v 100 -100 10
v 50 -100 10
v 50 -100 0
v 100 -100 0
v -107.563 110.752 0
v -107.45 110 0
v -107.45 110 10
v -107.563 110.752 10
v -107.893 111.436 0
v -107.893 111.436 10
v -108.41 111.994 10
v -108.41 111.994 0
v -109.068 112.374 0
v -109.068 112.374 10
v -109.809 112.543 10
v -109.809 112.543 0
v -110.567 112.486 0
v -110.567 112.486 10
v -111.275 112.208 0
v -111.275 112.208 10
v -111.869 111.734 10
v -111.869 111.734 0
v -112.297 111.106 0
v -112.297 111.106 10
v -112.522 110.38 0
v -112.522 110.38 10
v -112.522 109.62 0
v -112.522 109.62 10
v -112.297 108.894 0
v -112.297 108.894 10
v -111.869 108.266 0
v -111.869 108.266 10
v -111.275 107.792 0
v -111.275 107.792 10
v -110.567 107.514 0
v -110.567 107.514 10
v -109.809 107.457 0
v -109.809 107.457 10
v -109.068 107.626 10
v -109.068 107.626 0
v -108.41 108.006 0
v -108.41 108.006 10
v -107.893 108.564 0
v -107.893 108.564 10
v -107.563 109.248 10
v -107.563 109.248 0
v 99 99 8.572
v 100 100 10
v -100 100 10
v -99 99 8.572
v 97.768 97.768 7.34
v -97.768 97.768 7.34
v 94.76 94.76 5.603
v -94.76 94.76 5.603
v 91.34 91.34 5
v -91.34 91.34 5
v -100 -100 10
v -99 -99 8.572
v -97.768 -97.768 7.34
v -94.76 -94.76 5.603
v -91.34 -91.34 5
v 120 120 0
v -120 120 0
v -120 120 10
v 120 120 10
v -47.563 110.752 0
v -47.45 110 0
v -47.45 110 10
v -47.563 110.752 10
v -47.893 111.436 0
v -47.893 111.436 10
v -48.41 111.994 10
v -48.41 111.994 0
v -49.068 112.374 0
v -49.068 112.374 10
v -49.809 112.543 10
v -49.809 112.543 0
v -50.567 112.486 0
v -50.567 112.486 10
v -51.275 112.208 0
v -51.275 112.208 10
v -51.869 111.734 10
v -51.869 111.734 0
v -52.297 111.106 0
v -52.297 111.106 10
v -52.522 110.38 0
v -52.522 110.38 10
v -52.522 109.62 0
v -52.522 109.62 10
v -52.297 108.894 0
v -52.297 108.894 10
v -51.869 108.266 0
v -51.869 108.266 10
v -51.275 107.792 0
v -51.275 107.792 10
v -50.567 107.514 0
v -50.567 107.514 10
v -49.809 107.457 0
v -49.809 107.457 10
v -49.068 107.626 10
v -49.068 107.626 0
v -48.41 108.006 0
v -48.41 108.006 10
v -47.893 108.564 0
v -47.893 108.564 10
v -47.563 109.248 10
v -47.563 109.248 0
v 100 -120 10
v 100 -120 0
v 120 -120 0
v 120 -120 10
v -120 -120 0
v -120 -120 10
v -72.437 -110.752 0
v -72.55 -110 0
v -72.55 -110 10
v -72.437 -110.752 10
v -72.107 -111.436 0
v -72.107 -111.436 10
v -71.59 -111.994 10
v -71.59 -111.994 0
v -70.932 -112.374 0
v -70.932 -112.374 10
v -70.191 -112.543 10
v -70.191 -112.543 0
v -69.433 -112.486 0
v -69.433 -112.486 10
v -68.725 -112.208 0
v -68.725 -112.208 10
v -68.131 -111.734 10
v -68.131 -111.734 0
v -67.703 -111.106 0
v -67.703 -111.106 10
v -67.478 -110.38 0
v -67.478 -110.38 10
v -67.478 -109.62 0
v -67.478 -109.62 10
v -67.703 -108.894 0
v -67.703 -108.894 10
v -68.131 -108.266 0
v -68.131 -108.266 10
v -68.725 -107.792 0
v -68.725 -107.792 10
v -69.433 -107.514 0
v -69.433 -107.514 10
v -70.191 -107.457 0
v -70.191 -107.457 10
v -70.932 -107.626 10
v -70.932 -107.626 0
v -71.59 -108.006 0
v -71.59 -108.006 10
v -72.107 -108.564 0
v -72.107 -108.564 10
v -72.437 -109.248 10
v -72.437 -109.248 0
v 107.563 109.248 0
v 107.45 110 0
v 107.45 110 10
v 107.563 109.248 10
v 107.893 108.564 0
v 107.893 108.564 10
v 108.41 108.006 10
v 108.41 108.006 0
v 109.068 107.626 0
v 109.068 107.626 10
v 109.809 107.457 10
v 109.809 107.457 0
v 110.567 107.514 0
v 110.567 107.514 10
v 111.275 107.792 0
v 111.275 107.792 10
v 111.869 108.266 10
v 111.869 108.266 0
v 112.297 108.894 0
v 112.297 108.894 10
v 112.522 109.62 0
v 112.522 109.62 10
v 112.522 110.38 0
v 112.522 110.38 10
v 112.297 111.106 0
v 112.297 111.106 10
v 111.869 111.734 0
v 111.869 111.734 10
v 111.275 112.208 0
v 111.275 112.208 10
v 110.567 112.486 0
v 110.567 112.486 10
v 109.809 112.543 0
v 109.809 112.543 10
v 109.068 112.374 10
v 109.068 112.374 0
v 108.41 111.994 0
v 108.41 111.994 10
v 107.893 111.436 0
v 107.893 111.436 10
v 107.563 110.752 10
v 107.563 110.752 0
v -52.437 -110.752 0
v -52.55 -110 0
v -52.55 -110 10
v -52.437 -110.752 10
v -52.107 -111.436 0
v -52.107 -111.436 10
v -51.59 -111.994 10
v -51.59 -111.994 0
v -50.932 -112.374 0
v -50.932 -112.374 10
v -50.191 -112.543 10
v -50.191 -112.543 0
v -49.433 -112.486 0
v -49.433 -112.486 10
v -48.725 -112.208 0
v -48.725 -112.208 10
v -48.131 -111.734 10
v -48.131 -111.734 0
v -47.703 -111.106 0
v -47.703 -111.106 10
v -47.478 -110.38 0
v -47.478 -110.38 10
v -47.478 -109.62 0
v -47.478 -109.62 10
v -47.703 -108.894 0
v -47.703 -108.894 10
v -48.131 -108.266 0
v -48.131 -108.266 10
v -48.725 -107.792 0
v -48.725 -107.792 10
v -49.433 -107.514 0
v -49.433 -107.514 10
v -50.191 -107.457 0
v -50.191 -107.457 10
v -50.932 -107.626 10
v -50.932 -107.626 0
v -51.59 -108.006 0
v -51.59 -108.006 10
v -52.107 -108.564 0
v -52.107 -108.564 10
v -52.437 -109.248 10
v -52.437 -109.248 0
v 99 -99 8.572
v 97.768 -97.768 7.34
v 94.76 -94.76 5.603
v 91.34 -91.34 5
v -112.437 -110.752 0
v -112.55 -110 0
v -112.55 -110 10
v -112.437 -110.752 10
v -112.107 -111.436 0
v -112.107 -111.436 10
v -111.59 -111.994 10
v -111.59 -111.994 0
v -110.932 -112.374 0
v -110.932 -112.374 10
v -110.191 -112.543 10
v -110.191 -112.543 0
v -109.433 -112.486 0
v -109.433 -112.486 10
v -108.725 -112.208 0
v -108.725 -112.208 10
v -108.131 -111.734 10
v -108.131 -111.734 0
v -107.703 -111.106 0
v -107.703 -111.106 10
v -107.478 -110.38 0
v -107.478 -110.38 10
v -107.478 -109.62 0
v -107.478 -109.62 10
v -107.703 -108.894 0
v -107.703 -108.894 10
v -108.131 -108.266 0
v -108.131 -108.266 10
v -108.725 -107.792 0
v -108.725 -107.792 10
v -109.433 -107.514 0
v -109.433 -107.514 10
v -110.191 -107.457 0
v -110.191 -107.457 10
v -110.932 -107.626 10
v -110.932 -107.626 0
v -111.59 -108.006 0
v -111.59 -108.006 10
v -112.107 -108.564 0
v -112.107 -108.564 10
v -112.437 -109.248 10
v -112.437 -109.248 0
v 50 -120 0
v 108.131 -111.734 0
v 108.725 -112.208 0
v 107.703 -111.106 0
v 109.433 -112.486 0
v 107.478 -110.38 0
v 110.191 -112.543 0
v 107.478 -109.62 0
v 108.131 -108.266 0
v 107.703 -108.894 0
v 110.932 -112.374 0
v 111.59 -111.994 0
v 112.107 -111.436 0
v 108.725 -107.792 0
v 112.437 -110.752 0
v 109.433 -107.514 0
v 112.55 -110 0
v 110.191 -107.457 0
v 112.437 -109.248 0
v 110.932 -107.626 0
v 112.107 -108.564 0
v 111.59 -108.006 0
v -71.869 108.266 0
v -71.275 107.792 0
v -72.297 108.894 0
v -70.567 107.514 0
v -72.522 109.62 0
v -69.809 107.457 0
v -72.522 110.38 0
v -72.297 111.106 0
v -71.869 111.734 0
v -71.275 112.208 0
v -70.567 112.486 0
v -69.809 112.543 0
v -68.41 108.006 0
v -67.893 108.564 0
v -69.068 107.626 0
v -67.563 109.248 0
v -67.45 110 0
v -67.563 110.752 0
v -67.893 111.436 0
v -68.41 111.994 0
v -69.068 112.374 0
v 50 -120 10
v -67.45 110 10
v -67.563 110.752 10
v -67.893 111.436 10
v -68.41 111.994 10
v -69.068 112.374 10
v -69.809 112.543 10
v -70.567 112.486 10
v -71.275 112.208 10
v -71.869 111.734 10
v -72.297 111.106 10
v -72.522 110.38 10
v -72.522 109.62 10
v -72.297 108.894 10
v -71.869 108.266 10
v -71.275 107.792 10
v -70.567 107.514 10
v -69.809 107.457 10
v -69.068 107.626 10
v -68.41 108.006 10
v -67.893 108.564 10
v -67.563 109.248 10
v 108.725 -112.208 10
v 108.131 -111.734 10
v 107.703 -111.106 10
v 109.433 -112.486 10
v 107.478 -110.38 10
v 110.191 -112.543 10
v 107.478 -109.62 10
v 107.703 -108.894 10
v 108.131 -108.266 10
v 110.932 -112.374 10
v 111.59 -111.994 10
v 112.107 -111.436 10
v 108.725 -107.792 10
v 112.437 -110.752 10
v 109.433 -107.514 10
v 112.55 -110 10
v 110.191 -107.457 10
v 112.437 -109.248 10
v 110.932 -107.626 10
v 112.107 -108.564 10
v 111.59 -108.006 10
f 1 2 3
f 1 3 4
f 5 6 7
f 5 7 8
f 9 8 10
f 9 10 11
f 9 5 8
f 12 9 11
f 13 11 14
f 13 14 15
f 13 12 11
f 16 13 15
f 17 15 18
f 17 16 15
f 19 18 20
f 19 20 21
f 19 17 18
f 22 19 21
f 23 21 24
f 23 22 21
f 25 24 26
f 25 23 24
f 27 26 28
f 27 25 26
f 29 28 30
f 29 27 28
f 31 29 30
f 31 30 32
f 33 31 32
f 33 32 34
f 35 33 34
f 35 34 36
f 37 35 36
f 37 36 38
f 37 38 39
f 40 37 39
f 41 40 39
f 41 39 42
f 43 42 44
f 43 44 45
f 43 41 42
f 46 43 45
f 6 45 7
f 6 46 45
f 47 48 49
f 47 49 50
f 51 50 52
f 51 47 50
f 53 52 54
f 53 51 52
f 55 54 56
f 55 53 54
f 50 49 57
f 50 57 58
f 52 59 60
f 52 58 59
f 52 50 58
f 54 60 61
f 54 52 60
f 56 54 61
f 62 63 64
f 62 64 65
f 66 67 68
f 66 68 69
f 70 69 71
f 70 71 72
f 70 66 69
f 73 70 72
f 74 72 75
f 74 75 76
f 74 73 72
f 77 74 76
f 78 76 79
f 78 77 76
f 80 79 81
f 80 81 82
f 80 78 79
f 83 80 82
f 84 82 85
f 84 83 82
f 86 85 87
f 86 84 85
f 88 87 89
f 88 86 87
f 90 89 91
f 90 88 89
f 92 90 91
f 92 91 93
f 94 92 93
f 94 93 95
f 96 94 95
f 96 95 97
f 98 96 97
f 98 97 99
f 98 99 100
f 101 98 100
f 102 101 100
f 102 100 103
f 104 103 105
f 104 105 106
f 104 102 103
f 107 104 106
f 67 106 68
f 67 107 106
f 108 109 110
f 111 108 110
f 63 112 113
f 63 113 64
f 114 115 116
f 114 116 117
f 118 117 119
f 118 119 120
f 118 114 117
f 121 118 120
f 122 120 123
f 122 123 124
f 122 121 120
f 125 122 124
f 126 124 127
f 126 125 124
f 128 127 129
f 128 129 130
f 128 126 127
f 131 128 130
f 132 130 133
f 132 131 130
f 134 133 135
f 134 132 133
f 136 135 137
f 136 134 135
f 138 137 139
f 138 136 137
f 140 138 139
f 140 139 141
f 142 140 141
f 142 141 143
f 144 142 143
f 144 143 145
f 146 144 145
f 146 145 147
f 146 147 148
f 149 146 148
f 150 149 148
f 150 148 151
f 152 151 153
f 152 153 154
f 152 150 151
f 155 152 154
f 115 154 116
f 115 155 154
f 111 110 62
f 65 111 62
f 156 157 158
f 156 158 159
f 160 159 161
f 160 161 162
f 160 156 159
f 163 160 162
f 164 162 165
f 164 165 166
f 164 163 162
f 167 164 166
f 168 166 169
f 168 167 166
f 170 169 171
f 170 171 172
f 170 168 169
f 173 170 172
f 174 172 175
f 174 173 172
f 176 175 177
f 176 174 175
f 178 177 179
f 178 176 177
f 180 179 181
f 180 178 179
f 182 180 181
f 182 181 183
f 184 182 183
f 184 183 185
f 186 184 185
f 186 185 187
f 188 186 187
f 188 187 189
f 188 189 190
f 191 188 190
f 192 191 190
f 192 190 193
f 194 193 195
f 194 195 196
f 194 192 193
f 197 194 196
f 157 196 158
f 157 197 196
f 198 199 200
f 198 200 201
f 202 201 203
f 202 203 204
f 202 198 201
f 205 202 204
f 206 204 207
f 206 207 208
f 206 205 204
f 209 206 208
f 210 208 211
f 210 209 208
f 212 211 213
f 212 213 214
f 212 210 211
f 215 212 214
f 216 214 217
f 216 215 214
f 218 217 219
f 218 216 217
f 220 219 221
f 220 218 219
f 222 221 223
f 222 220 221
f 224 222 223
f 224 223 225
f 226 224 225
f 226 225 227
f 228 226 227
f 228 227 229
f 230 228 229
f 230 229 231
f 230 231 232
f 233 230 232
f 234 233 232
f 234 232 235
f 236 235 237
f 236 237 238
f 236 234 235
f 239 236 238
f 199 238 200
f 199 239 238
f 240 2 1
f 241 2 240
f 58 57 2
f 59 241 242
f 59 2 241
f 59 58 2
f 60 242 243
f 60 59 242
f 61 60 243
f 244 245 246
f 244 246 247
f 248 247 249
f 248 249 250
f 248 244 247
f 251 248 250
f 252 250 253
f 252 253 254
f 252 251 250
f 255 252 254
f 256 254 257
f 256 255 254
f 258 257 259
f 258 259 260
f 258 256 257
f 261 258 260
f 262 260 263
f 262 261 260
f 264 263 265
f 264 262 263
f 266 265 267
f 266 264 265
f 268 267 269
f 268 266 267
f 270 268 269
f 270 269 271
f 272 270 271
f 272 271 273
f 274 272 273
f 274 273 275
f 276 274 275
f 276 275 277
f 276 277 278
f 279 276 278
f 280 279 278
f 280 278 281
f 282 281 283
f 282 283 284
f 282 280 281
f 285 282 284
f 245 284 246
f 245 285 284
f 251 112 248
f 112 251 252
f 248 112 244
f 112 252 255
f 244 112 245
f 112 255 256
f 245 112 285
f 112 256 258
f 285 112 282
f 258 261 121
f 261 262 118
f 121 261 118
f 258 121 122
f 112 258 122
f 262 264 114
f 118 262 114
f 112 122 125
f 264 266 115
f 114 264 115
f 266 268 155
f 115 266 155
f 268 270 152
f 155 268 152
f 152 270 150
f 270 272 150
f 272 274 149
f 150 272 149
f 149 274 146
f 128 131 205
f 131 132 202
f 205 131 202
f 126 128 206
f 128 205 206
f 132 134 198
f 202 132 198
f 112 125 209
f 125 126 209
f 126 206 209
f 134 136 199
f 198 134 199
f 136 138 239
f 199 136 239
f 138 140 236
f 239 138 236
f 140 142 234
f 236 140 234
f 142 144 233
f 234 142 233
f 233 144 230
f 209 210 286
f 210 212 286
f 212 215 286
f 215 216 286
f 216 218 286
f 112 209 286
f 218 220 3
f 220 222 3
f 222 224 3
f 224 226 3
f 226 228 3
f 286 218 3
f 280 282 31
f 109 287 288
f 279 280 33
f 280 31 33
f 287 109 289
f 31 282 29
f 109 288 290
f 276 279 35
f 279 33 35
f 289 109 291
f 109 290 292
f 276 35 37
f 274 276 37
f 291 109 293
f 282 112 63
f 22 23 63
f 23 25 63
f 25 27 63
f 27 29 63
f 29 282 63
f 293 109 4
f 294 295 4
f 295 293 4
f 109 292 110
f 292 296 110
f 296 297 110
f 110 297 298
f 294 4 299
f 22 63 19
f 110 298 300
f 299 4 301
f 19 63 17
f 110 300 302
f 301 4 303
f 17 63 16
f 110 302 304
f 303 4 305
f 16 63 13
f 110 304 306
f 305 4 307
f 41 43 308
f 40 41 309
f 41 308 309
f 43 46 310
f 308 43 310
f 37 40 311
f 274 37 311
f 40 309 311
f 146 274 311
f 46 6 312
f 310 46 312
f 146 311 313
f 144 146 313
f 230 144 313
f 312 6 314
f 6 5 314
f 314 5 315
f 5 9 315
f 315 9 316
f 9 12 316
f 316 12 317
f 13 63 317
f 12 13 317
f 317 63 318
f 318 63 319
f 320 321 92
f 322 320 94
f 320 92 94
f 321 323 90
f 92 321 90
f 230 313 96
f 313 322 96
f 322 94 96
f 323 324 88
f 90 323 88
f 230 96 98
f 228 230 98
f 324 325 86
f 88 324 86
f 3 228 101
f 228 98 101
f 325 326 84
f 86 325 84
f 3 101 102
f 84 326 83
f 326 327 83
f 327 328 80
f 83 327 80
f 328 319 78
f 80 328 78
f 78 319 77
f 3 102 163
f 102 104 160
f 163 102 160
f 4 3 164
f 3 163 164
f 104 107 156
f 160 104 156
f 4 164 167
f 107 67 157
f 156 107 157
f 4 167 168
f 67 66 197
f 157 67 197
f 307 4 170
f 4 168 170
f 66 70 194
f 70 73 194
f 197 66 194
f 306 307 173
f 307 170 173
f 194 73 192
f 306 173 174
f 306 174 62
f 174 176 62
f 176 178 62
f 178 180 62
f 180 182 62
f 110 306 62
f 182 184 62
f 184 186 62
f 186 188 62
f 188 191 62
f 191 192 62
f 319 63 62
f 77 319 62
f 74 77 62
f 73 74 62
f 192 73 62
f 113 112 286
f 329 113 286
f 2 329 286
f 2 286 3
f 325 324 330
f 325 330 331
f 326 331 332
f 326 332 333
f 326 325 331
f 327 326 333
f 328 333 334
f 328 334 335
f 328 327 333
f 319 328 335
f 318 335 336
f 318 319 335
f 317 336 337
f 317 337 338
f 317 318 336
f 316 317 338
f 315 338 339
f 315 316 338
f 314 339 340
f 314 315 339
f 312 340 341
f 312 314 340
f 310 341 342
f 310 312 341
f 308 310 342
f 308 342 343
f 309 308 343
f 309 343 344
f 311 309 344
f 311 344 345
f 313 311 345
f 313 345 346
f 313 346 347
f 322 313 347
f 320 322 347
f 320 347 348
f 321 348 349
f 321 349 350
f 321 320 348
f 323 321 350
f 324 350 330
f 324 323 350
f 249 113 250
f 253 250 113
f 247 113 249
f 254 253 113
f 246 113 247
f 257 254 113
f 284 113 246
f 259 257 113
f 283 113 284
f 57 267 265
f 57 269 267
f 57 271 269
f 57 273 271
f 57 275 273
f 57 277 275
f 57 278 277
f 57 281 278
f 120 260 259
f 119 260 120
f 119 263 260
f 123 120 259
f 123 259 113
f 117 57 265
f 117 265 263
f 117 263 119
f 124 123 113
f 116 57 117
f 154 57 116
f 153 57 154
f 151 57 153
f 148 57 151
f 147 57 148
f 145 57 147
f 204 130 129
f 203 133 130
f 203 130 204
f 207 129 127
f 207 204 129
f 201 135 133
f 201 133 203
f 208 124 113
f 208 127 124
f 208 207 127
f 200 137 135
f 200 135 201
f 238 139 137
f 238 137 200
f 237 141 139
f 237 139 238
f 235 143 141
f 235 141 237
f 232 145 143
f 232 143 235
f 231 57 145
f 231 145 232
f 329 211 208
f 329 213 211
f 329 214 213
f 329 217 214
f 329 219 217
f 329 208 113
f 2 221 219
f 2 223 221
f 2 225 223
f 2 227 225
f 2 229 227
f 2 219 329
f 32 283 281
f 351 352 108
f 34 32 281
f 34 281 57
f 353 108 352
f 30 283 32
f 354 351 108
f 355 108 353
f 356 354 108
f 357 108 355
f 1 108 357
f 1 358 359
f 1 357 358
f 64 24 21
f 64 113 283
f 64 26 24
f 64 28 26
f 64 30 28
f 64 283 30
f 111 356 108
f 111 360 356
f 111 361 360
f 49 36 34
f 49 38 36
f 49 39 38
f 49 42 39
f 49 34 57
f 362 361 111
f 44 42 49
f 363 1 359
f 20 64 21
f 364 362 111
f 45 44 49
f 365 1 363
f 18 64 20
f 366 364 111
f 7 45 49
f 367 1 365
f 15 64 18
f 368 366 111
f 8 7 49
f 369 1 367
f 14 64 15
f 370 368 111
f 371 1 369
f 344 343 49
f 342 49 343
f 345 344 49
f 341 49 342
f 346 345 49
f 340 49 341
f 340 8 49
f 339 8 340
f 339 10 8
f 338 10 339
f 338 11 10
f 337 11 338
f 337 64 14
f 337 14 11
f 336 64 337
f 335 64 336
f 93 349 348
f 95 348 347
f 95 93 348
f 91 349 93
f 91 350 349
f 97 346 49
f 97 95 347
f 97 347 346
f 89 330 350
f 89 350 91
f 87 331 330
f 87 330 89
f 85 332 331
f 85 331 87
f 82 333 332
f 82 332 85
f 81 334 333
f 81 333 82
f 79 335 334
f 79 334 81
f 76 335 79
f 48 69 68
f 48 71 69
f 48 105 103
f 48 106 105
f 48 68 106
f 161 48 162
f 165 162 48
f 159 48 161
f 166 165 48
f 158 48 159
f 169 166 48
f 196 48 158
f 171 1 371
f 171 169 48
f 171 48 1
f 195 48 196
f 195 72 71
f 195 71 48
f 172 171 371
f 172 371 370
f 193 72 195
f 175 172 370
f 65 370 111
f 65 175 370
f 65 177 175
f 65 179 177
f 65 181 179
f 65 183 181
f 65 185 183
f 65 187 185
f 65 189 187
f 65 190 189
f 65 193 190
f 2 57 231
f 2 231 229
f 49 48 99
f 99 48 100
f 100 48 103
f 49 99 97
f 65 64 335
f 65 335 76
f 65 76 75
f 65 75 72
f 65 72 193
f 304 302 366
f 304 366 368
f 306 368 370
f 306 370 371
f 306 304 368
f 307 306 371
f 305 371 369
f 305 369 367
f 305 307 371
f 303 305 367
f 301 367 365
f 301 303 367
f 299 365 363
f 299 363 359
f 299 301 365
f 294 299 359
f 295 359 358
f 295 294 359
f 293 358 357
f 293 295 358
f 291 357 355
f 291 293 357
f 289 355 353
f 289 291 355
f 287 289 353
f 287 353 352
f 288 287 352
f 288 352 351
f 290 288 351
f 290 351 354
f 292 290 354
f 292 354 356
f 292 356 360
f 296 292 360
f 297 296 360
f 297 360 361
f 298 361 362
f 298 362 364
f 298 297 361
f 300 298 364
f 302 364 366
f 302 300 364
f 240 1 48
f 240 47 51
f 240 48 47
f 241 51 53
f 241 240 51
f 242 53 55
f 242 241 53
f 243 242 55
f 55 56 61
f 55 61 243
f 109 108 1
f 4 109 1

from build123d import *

# Parameters (mm, degrees)
SKETCH1_W           = 240
SKETCH1_H           = 240
SKETCH1_R           = 2.55
BOSS_EXTRUDE1_DEPTH = 10
SKETCH2_W           = 200
SKETCH2_H           = 200
CUT_EXTRUDE1_DEPTH  = 5
FILLET1_R           = 10
SKETCH3_W           = 50
SKETCH3_H           = 20
CUT_EXTRUDE2_DEPTH  = 150


with BuildPart() as part:
    # Sketch1 → Boss-Extrude1 (new body)
    with BuildSketch(Plane.XY):
        Rectangle(SKETCH1_W, SKETCH1_H)
        with Locations((-110, 110)):
            Circle(SKETCH1_R, mode=Mode.SUBTRACT)
        with Locations(Location((110, 110, 0), (0, 0, 180))):
            Circle(SKETCH1_R, mode=Mode.SUBTRACT)
        with Locations((110, -110)):
            Circle(SKETCH1_R, mode=Mode.SUBTRACT)
        with Locations(Location((-110, -110, 0), (0, 0, 180))):
            Circle(SKETCH1_R, mode=Mode.SUBTRACT)
        with Locations((-70, 110)):
            Circle(SKETCH1_R, mode=Mode.SUBTRACT)
        with Locations(Location((-70, -110, 0), (0, 0, 180))):
            Circle(SKETCH1_R, mode=Mode.SUBTRACT)
        with Locations((-50, 110)):
            Circle(SKETCH1_R, mode=Mode.SUBTRACT)
        with Locations(Location((-50, -110, 0), (0, 0, 180))):
            Circle(SKETCH1_R, mode=Mode.SUBTRACT)
    extrude(amount=BOSS_EXTRUDE1_DEPTH)

    # Sketch2 → Cut-Extrude1 (cut)
    with BuildSketch(Plane.XY.offset(10)):
        Rectangle(SKETCH2_W, SKETCH2_H)
    extrude(amount=-CUT_EXTRUDE1_DEPTH, mode=Mode.SUBTRACT)

    # Fillet1
    # the kernel refuses this fillet: 10 mm, written as the material it adds along each edge
    with BuildSketch(Plane(origin=(100, -100, 5), x_dir=(0, 0, 1), z_dir=(0, 1, 0)), Plane(origin=(-100, -100, 5), x_dir=(0, 0, 1), z_dir=(1, 0, 0)), Plane(origin=(-100, 100, 5), x_dir=(0, 0, 1), z_dir=(0, -1, 0)), Plane(origin=(100, 100, 5), x_dir=(0, 0, 1), z_dir=(-1, 0, 0))) as fillet1_piece_1:
        with BuildLine():
            CenterArc((10, -8.660254038), FILLET1_R, 120, 60)
            Line((0, -8.660254038), (0, 0))
            Line((0, 0), (5, 0))
        make_face()
    extrude(amount=200)

    # Sketch3 → Cut-Extrude2 (cut)
    with BuildSketch(Plane.XY.offset(10)):
        with Locations((75, -110)):
            Rectangle(SKETCH3_W, SKETCH3_H)
    extrude(amount=-CUT_EXTRUDE2_DEPTH, mode=Mode.SUBTRACT)


solid = part.part
